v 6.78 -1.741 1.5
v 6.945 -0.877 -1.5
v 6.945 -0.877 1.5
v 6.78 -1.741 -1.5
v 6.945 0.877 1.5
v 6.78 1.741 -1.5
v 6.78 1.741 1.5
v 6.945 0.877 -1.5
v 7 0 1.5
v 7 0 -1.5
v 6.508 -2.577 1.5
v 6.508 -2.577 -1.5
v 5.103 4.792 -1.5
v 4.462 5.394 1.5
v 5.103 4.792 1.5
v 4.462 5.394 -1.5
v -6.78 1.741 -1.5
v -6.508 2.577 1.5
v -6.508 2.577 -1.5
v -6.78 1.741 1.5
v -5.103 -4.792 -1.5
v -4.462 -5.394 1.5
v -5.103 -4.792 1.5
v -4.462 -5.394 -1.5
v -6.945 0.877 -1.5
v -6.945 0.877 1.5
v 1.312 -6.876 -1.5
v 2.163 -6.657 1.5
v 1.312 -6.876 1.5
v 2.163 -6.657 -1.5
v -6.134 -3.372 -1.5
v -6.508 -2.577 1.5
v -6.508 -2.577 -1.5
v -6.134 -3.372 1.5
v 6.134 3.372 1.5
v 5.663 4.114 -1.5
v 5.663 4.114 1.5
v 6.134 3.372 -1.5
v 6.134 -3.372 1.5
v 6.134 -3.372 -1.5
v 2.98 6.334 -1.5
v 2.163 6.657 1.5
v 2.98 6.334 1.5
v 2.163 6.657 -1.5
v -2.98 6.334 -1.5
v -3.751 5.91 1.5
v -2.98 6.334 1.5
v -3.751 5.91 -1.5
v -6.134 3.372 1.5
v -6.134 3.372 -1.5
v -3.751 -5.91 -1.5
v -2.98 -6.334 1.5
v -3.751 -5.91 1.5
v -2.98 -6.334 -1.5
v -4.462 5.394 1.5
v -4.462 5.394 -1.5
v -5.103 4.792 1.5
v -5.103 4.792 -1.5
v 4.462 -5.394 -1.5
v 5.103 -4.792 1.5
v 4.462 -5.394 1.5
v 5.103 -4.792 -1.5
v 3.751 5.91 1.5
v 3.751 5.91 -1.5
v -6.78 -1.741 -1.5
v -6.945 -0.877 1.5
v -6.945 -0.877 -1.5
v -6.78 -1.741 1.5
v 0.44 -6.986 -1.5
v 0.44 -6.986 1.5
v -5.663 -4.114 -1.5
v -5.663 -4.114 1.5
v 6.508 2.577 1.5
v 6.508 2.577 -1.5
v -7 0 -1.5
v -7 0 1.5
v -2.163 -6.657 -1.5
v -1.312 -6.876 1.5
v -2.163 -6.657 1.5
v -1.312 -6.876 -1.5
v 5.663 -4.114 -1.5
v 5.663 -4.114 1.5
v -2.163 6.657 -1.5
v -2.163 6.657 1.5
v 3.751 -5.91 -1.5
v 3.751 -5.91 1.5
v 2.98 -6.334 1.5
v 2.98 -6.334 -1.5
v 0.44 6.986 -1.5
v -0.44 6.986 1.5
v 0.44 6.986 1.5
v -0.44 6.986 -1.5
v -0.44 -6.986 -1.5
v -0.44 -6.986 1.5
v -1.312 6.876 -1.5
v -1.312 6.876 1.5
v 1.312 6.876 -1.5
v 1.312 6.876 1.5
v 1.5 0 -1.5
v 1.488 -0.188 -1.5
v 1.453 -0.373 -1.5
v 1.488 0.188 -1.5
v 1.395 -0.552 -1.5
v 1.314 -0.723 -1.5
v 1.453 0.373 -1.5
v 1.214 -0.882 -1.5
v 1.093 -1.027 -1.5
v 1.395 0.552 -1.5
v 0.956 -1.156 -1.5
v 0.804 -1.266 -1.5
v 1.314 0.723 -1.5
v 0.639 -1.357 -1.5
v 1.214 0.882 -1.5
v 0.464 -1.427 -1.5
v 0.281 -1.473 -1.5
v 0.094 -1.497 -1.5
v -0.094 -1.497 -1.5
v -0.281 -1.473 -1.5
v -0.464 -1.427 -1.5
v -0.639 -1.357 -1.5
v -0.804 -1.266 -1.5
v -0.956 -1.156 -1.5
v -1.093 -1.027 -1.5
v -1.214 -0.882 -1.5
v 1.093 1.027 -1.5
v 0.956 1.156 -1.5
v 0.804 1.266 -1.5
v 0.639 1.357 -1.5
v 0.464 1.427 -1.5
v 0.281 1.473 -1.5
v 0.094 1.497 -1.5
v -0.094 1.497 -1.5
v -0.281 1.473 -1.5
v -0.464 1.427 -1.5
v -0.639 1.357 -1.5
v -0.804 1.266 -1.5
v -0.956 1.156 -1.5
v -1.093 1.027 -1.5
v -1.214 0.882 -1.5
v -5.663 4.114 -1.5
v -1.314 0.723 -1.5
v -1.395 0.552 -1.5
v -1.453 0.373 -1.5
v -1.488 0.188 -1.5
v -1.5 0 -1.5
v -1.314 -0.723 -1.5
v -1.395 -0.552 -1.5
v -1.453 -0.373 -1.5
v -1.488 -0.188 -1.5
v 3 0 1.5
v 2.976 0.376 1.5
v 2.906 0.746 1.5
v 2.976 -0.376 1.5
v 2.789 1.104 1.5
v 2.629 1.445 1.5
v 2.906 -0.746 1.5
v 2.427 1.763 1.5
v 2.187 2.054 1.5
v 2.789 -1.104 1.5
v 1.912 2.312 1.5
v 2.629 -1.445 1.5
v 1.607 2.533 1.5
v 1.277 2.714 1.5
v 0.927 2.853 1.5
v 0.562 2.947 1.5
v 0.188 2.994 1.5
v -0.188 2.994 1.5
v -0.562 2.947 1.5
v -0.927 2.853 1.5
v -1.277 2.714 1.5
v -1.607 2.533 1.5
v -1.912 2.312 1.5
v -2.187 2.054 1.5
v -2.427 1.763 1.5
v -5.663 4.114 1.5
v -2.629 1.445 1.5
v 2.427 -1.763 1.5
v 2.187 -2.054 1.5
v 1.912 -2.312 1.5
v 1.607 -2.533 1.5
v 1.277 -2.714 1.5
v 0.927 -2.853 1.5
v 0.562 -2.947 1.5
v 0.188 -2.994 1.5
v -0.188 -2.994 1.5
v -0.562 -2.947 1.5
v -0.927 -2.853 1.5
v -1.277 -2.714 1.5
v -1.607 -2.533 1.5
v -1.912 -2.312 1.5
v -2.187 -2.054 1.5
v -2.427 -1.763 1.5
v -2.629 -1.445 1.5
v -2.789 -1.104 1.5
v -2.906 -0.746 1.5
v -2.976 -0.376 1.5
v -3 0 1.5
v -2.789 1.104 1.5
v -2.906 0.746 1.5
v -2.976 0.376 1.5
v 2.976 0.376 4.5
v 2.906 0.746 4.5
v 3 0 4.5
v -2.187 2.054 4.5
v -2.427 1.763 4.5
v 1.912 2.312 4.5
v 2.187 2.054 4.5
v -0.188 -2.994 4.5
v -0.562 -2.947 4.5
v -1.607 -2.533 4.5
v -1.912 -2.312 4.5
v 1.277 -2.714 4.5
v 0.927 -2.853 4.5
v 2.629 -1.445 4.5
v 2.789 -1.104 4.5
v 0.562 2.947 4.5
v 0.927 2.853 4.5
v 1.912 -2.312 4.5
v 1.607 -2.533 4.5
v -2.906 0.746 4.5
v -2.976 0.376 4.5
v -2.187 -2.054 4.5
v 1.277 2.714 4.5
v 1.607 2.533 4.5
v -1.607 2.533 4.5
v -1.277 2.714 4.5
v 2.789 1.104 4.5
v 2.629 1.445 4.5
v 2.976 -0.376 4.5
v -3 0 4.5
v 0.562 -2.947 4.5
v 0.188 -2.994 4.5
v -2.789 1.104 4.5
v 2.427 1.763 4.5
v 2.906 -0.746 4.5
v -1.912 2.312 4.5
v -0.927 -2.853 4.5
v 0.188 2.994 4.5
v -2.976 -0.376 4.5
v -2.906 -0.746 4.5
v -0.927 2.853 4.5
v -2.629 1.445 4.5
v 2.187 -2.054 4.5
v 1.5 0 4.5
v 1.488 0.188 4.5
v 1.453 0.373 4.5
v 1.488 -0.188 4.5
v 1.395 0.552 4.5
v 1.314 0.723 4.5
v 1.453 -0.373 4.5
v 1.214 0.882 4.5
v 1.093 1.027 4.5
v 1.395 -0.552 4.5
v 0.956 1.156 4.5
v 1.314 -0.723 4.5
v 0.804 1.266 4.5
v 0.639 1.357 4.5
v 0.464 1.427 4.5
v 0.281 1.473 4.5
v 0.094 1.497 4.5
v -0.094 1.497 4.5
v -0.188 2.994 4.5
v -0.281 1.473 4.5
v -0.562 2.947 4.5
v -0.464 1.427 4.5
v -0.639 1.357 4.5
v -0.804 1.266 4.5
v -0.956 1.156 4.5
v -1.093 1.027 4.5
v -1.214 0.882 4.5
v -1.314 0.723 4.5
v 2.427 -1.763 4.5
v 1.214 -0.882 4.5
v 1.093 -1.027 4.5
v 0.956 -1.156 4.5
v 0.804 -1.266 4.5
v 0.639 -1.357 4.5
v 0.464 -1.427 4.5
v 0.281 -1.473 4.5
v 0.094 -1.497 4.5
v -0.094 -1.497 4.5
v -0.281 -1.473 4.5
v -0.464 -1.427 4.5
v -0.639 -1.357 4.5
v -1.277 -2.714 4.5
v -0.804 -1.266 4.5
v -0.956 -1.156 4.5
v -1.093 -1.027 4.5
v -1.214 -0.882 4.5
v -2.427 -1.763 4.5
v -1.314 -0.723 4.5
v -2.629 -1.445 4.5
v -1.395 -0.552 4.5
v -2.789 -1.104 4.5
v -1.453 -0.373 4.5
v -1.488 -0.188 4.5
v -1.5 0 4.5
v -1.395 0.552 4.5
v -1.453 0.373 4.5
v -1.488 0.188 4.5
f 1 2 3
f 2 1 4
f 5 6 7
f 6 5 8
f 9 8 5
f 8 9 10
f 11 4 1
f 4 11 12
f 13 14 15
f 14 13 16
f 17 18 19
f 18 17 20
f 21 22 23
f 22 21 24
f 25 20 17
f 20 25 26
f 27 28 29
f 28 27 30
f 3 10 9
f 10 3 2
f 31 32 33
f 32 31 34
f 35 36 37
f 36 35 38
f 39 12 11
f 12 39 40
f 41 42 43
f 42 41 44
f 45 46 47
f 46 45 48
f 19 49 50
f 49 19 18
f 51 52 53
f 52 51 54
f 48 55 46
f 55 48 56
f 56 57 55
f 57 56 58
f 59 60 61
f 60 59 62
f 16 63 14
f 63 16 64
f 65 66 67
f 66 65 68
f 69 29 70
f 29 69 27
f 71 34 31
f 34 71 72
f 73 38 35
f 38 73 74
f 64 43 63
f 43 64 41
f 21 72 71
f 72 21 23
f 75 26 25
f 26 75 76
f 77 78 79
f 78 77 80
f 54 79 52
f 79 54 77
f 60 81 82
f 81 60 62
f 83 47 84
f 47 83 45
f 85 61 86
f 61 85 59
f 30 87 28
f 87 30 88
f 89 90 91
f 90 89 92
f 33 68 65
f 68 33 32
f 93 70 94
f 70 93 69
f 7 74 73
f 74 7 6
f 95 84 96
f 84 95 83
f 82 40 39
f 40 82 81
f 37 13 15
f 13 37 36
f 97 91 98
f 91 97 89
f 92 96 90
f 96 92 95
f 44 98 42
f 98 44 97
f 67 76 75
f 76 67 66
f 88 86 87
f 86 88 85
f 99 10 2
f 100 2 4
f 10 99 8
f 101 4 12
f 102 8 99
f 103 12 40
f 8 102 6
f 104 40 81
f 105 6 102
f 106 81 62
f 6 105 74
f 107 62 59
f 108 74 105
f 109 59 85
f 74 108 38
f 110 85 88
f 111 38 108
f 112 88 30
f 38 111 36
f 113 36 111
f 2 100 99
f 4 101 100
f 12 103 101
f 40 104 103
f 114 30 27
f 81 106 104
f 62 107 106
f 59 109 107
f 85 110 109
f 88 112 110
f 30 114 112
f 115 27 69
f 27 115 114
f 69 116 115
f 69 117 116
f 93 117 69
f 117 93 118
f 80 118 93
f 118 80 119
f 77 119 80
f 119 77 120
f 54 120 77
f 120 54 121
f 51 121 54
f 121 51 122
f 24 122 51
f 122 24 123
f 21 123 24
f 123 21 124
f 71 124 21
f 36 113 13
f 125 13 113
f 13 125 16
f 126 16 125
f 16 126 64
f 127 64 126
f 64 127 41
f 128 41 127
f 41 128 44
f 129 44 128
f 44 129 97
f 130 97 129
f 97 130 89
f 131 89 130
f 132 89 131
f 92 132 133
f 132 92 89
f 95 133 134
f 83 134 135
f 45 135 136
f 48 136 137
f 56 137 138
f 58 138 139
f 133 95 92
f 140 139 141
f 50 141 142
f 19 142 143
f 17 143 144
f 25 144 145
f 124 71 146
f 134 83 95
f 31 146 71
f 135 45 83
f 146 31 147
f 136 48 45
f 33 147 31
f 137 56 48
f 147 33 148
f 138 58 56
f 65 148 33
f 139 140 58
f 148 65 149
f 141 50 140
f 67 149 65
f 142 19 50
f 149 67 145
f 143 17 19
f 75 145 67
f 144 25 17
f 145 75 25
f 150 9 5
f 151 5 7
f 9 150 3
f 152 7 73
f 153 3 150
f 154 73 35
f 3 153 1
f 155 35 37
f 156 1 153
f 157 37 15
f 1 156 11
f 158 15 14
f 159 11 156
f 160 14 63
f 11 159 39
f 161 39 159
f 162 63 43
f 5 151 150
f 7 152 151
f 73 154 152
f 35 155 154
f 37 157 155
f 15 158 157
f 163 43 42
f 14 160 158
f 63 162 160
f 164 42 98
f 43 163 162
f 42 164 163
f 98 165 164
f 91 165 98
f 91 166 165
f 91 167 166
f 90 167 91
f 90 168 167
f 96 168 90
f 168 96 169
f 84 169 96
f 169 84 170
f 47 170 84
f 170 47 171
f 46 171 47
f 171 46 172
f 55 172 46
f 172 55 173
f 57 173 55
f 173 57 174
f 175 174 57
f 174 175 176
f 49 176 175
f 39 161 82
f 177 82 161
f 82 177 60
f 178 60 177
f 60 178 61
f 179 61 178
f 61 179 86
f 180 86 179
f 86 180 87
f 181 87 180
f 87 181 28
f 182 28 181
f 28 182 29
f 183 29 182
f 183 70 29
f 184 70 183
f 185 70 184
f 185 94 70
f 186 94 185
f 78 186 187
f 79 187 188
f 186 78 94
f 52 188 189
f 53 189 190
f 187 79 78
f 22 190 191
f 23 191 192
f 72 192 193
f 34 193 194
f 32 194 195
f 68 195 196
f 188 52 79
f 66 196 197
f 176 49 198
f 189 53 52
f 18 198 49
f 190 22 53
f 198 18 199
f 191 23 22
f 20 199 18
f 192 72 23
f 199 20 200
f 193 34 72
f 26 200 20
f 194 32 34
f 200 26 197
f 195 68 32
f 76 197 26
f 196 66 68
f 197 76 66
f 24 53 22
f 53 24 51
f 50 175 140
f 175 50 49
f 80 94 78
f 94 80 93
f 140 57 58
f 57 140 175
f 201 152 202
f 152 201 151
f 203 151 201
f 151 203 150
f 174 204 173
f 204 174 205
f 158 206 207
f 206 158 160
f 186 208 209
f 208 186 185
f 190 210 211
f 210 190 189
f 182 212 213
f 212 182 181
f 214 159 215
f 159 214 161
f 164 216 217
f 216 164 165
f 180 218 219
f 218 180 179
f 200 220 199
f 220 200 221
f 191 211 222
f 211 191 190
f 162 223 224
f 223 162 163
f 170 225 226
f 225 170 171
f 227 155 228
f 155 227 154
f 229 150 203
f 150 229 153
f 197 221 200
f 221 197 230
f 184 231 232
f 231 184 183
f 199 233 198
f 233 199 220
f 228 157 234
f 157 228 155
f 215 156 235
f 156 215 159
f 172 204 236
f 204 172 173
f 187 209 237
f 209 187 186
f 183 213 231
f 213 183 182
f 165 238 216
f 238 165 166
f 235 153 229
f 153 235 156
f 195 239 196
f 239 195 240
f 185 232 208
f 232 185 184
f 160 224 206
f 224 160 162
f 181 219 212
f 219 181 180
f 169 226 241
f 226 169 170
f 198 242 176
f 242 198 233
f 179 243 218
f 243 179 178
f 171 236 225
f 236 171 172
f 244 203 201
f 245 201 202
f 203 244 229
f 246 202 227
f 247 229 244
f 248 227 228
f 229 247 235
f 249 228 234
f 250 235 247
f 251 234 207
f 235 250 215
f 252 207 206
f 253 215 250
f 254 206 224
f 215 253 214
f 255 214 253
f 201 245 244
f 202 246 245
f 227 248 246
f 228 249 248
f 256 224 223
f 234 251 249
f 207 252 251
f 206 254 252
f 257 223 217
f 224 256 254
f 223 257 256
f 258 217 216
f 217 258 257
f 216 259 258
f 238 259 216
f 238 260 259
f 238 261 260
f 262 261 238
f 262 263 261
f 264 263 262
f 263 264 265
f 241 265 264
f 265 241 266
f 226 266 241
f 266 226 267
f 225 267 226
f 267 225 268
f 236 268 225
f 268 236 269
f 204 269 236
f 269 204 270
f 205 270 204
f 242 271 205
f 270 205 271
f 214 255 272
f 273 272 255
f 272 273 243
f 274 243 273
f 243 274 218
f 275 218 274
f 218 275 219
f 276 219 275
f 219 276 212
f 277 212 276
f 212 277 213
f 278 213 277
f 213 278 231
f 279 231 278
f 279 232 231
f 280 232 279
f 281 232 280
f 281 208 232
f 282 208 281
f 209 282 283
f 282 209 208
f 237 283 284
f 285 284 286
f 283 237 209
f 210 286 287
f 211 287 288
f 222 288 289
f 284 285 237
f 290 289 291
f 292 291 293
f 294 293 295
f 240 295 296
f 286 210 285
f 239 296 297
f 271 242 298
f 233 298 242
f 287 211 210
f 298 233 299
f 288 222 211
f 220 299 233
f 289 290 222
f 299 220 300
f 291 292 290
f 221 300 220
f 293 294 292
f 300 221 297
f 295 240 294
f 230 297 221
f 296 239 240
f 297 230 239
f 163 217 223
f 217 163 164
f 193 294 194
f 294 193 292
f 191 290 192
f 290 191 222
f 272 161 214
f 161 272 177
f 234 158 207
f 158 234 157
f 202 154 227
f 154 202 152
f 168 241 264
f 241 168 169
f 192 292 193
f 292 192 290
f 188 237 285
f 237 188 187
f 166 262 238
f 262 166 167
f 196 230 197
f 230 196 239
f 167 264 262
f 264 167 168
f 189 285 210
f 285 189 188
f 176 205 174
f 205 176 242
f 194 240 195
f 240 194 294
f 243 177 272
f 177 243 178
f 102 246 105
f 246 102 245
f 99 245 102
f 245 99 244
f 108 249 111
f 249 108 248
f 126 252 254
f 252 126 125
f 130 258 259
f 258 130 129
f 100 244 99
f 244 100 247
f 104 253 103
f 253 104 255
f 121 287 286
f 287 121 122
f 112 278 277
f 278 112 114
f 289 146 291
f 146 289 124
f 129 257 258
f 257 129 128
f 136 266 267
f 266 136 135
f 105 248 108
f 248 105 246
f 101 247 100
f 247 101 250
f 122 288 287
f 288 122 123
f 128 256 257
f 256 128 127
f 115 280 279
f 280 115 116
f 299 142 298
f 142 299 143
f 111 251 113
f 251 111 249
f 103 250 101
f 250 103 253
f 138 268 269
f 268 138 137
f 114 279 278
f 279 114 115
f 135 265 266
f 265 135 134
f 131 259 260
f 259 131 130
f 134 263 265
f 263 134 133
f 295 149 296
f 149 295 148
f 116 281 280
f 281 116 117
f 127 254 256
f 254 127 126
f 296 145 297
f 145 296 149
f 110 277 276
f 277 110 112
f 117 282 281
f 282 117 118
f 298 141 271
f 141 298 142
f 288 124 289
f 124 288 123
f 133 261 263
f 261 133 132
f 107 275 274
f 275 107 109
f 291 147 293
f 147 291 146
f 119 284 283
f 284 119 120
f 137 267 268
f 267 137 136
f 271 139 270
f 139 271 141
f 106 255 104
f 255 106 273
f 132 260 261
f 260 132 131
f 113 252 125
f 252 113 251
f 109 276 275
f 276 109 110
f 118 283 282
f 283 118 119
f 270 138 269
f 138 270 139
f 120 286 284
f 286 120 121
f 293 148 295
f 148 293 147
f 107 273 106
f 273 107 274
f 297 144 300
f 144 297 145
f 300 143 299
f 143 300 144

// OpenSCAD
$fn = 50;


difference() {
	union() {
		translate(v = [0, 0, -1.5000000000]) {
			cylinder(h = 3, r = 7.0000000000);
		}
		translate(v = [0, 0, -1.5000000000]) {
			cylinder(h = 6, r = 3.0000000000);
		}
	}
	union() {
		translate(v = [0, 0, -50.0000000000]) {
			cylinder(h = 100, r = 1.5000000000);
		}
	}
}
